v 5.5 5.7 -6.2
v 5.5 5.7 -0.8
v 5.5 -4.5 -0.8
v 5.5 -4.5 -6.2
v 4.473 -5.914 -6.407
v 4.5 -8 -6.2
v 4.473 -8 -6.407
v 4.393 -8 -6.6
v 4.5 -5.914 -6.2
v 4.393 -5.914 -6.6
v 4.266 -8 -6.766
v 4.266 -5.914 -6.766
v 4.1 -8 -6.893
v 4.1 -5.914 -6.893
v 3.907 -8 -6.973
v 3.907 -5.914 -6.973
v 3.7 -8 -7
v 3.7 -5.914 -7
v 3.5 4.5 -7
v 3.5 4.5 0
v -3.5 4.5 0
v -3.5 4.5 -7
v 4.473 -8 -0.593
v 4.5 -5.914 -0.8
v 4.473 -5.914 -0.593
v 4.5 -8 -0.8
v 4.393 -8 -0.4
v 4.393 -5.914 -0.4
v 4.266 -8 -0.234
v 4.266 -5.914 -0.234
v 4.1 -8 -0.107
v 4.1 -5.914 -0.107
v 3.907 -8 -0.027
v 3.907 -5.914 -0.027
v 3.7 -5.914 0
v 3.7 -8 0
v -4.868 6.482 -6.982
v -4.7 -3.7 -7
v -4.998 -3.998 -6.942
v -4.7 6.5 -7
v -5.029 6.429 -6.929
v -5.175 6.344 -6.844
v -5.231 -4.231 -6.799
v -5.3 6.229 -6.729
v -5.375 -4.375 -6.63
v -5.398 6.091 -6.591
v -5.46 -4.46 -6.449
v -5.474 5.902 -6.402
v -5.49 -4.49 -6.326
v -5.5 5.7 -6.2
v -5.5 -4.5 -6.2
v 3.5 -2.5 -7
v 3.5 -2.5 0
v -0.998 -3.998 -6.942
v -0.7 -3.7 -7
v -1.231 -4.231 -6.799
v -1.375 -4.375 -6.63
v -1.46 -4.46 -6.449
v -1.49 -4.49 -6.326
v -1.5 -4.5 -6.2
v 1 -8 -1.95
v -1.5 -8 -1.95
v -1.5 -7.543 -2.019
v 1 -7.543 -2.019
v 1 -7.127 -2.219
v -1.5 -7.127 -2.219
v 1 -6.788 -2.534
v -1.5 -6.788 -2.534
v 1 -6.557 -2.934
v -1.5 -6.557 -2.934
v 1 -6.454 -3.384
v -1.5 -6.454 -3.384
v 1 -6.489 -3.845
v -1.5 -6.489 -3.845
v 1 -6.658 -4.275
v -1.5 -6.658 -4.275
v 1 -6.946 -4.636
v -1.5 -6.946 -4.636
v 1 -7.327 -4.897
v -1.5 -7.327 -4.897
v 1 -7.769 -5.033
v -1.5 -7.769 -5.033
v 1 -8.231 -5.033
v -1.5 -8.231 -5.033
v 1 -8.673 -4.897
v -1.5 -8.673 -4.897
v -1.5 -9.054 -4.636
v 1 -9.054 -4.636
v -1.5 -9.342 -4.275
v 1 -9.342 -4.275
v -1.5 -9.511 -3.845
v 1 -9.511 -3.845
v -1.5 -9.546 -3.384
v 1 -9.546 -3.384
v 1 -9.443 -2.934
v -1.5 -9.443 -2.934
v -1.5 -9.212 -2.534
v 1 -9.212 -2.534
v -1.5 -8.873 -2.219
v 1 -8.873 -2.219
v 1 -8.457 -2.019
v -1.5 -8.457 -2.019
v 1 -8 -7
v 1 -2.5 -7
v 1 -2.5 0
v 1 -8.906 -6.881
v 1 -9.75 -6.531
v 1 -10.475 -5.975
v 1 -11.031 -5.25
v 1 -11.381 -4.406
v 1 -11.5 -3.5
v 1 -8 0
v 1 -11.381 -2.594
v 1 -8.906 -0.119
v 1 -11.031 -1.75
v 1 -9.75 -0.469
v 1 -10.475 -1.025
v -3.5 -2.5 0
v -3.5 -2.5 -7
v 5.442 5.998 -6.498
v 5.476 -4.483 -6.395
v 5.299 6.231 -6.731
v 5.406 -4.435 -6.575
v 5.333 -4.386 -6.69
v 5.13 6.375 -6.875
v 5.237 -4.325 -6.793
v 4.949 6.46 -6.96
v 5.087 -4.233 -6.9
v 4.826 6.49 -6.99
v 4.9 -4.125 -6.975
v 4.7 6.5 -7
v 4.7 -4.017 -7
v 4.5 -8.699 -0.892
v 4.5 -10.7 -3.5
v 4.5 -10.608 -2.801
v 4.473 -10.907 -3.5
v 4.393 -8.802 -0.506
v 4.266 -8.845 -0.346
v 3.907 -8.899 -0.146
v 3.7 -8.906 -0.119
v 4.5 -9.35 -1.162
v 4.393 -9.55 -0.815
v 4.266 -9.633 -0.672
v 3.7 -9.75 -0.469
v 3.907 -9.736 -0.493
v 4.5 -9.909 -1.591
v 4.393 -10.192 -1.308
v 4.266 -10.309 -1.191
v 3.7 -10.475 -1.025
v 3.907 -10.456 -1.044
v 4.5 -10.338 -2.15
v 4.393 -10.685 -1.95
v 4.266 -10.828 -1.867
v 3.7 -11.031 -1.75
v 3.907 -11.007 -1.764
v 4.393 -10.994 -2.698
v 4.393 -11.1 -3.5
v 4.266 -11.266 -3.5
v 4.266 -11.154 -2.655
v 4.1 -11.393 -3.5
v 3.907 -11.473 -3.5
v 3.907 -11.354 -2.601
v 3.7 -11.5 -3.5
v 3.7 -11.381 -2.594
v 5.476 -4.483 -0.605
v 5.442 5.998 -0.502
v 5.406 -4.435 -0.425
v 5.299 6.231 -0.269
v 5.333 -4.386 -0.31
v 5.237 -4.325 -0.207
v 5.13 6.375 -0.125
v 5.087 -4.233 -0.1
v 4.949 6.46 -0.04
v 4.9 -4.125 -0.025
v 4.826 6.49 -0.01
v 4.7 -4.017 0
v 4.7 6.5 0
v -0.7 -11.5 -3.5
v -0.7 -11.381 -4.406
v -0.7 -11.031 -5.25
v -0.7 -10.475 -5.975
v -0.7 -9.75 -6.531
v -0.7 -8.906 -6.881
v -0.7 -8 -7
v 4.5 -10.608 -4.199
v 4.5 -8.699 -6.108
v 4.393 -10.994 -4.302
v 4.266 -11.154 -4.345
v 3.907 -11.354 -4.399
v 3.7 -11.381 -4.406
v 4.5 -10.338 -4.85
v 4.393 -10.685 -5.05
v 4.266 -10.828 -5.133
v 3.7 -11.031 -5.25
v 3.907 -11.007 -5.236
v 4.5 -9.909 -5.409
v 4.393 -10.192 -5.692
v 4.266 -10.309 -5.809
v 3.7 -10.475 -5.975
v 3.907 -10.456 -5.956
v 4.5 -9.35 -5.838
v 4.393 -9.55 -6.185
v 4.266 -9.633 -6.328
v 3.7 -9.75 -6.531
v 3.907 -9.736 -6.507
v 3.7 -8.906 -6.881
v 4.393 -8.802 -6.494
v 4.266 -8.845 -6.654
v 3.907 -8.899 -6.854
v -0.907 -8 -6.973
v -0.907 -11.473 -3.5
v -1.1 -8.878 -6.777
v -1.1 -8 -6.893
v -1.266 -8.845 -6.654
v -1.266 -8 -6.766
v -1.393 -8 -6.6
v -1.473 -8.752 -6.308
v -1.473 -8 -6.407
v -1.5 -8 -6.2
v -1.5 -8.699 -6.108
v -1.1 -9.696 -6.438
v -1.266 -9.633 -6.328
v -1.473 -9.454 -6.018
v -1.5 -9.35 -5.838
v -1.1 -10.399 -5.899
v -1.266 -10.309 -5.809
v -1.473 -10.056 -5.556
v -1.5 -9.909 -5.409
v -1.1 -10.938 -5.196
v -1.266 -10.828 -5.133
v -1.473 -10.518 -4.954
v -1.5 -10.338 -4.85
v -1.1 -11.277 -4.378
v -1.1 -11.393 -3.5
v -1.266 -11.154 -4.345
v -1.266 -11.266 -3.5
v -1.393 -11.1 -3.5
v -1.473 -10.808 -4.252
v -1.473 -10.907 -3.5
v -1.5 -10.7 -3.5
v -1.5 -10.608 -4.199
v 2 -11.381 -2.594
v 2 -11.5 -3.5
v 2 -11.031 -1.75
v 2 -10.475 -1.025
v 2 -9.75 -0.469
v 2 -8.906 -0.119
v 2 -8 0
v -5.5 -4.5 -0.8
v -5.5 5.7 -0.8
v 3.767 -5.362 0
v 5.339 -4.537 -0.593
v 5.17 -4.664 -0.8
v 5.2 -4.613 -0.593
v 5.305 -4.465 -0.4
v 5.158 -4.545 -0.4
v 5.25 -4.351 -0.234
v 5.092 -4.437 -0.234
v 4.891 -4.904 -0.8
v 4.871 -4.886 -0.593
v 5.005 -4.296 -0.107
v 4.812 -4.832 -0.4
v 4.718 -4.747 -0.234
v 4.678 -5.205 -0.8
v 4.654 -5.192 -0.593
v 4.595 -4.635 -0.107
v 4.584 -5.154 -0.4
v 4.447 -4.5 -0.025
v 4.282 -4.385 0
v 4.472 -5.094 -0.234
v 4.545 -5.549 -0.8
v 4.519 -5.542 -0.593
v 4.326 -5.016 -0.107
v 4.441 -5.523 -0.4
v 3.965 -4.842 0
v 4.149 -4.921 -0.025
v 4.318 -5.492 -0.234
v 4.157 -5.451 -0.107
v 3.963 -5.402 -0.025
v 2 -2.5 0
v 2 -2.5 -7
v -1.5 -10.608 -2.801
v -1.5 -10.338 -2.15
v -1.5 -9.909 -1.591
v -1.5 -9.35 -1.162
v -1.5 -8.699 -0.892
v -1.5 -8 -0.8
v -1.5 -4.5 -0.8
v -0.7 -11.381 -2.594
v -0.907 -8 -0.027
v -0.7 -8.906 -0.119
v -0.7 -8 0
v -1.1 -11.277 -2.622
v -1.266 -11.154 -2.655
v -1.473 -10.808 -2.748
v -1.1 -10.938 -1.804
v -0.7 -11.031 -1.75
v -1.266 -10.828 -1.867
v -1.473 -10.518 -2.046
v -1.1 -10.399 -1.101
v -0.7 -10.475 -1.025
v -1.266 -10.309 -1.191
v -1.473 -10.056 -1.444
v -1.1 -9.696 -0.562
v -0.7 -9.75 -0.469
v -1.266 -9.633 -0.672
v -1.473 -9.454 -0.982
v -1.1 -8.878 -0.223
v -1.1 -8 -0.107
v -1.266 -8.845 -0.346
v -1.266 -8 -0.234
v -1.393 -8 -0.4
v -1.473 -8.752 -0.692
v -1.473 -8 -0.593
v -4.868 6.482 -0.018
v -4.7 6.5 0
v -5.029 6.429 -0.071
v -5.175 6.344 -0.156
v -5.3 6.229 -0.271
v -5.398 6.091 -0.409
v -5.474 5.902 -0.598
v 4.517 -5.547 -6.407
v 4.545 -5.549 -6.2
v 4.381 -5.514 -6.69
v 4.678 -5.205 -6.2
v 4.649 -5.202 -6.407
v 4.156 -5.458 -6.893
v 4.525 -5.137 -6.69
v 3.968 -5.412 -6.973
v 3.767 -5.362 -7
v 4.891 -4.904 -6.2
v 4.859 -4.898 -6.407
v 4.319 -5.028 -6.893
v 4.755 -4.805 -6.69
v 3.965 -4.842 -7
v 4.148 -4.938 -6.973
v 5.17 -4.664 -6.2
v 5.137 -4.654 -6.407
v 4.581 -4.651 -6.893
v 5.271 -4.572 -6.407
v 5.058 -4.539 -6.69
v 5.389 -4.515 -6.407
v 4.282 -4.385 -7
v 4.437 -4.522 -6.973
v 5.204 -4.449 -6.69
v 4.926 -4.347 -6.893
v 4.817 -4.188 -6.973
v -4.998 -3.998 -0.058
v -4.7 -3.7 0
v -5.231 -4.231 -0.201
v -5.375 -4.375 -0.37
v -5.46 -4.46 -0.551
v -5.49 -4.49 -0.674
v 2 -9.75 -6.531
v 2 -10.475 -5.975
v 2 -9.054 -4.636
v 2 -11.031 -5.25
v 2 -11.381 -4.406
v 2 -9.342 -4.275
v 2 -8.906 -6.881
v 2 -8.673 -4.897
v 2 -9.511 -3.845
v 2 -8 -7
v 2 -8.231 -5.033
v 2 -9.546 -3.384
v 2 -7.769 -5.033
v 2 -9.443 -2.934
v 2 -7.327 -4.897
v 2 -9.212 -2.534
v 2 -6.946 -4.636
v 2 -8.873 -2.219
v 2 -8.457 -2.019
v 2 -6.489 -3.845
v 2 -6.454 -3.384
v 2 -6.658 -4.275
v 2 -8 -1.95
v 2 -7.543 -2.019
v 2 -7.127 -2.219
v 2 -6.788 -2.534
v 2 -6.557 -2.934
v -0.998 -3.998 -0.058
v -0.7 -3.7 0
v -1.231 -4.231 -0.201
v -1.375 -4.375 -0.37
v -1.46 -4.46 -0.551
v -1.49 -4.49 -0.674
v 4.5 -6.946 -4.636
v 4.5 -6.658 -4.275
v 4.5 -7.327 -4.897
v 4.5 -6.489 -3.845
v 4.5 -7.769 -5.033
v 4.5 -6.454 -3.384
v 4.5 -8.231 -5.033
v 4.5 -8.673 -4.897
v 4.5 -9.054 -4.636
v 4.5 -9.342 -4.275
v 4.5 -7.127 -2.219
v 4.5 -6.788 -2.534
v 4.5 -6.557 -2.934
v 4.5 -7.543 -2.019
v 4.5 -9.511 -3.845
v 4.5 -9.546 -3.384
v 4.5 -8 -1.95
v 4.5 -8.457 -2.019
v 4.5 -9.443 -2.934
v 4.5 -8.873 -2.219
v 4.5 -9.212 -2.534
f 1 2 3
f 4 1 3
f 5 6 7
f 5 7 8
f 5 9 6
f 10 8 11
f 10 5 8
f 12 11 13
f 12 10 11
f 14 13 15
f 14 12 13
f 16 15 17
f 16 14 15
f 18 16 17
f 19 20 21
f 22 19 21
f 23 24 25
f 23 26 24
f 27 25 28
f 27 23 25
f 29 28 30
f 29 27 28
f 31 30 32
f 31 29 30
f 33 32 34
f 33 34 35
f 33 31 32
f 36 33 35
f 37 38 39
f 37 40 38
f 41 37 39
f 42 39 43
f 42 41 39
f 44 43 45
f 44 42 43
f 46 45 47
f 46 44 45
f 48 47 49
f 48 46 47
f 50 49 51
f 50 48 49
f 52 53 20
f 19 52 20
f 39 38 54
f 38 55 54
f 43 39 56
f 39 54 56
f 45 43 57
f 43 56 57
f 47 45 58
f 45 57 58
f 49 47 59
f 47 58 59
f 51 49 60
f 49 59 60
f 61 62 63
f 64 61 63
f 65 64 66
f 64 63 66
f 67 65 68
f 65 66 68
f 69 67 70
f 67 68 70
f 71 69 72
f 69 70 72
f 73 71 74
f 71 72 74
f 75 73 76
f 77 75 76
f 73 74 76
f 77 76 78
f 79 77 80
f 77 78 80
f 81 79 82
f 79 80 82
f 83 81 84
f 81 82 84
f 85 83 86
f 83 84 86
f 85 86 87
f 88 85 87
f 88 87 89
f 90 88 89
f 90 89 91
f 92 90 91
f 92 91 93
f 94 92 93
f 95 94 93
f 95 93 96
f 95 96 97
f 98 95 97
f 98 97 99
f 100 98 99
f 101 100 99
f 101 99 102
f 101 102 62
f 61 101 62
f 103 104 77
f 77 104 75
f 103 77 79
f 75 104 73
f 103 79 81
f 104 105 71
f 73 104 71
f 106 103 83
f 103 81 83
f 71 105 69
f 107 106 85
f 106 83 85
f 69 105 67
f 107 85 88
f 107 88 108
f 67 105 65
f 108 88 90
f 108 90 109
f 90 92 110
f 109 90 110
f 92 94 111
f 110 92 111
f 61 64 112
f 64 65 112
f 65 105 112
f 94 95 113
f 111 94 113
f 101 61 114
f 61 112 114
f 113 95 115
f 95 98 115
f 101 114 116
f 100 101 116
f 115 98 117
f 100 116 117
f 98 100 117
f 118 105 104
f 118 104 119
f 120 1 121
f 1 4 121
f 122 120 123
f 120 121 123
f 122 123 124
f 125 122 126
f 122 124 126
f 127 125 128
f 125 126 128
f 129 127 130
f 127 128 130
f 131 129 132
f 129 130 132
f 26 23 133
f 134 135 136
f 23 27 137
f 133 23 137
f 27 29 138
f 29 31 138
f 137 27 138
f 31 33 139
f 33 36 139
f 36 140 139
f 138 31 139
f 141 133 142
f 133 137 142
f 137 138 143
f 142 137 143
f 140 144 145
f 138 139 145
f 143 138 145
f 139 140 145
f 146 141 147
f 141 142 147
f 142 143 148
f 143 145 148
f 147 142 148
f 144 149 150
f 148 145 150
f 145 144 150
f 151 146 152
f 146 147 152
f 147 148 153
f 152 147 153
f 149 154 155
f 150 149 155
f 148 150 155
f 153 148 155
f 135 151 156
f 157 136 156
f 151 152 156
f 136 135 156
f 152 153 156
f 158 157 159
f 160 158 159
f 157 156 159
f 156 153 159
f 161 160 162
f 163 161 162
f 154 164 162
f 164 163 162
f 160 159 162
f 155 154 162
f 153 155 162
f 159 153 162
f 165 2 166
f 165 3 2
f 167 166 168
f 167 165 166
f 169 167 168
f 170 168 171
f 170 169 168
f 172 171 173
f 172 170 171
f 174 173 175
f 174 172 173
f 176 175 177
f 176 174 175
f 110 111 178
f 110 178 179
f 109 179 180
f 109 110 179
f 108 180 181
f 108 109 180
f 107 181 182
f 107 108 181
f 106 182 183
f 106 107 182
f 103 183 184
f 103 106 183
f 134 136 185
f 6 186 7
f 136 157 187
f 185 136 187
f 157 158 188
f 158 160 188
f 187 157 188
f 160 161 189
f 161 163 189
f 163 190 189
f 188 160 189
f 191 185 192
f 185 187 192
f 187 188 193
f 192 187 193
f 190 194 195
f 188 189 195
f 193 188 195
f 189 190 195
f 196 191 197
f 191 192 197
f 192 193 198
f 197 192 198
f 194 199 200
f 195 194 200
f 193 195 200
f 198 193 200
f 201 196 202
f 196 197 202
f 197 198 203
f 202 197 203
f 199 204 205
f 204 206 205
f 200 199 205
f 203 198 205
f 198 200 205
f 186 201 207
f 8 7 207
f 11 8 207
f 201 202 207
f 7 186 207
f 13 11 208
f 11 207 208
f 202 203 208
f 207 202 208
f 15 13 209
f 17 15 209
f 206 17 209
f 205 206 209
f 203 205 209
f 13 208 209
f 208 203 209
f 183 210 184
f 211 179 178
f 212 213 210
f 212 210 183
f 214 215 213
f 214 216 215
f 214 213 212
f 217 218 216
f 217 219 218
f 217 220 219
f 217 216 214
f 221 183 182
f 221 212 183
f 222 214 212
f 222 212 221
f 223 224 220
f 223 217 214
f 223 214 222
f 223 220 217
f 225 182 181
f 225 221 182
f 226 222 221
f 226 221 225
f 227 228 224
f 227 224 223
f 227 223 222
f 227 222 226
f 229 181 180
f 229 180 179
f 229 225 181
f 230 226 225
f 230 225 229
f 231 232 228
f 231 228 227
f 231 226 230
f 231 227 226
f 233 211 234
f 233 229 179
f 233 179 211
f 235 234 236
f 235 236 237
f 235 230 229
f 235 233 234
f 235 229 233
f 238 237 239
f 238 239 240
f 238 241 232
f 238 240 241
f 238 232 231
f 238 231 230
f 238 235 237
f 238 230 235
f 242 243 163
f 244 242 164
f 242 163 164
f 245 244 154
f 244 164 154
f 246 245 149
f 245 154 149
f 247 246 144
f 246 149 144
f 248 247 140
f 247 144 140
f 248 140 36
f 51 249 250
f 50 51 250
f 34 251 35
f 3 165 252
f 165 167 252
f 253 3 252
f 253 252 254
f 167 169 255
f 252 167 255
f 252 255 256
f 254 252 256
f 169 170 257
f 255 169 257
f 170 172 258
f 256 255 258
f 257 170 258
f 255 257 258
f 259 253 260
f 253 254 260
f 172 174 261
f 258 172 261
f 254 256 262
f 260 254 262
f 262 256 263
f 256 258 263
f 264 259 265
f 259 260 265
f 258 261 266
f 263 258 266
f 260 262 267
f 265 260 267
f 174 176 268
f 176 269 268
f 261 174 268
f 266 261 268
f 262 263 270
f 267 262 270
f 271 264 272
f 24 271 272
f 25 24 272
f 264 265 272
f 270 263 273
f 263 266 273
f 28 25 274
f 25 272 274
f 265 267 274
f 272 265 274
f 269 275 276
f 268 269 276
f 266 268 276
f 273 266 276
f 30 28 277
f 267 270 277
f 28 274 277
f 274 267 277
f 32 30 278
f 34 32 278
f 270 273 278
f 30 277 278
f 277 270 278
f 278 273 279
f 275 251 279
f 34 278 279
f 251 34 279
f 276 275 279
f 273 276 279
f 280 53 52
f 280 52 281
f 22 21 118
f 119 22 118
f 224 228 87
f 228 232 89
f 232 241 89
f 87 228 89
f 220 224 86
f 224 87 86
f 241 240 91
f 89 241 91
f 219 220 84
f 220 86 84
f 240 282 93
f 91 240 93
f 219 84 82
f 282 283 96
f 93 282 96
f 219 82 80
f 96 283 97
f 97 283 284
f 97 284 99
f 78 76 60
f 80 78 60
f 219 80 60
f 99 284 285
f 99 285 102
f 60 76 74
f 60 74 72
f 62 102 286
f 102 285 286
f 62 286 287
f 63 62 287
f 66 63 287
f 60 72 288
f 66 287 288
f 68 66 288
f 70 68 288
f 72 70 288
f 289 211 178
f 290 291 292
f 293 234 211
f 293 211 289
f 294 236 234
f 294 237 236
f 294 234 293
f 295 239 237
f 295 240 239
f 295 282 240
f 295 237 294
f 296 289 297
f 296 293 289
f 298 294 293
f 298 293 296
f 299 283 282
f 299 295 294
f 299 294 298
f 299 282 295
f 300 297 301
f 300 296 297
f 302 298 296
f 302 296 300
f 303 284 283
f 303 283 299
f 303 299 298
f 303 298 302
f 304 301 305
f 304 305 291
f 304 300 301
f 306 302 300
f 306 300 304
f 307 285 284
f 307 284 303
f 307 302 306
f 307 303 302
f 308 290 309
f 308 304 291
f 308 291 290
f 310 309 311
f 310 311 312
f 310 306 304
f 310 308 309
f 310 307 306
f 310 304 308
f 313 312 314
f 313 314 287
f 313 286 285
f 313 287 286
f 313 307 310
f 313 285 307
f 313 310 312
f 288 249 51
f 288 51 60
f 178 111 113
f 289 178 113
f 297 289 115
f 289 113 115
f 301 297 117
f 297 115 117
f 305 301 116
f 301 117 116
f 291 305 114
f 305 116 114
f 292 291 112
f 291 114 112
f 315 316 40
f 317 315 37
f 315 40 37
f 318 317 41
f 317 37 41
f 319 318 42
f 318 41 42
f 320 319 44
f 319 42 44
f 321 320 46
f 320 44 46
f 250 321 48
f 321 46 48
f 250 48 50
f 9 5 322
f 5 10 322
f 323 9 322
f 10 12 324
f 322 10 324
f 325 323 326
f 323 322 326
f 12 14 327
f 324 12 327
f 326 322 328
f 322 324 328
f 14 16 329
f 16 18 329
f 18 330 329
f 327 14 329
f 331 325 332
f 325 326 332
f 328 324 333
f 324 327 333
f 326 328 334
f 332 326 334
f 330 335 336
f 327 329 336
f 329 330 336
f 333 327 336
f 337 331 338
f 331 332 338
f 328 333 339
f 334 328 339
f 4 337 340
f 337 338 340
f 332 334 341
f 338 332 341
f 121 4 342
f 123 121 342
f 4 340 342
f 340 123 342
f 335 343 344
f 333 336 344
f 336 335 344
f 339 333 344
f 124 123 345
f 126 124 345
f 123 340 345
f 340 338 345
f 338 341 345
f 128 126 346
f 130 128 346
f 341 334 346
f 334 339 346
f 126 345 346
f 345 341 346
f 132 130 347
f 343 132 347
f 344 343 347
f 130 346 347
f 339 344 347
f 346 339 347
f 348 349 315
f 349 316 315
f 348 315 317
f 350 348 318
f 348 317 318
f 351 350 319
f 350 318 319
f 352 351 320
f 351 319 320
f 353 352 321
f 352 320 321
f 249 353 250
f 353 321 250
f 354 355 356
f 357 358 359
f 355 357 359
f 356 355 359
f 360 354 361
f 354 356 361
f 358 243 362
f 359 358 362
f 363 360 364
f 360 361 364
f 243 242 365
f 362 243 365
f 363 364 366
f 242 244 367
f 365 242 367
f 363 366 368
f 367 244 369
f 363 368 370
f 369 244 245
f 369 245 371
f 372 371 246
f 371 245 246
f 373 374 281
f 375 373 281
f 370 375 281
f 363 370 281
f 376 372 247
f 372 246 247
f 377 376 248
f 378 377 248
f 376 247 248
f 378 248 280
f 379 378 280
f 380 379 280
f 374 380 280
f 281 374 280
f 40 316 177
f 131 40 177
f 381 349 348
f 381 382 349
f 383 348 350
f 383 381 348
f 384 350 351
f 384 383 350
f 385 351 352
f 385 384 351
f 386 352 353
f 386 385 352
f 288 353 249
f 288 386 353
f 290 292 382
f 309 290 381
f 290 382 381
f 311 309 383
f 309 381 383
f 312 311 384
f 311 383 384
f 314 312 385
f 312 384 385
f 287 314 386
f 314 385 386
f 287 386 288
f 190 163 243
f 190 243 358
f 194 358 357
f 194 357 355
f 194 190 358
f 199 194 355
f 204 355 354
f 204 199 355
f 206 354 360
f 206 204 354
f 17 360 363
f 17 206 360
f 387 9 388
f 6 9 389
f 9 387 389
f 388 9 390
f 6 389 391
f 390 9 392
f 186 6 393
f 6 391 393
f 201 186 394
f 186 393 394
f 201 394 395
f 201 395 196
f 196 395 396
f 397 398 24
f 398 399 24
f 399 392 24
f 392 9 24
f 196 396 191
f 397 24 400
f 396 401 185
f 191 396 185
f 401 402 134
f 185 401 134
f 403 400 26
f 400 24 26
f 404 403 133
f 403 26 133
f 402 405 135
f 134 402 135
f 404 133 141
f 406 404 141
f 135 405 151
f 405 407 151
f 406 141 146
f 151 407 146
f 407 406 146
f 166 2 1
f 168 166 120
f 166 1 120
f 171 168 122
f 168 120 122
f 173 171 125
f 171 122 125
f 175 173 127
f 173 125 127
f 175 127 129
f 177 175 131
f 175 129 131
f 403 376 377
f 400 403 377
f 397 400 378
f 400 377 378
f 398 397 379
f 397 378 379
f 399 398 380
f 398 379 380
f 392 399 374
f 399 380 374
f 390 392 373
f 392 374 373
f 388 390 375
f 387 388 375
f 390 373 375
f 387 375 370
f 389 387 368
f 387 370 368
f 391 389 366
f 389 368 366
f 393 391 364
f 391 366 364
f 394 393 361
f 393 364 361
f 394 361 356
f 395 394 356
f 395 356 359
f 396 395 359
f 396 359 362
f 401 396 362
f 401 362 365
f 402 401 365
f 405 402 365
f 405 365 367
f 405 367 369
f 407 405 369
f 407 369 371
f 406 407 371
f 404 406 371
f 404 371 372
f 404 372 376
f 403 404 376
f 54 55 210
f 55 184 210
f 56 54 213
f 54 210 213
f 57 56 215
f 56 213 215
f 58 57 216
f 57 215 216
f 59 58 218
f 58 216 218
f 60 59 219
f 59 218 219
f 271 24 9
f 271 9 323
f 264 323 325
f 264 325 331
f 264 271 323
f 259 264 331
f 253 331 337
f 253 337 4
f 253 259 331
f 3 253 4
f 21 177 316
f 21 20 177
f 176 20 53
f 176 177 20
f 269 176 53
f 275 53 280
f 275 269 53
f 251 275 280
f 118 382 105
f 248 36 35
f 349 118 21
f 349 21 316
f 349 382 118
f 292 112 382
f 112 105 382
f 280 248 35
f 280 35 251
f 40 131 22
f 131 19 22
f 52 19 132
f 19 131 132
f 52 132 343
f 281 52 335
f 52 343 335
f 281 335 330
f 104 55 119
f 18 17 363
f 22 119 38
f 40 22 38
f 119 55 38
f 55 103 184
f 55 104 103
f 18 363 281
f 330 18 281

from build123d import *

# Parameters (mm, degrees)
EXTRUDE_1_DEPTH     = 7
FILLET_1_R          = 3.5
SKETCH_2_R          = 1.55
CUT_EXTRUDE_1_DEPTH = 16.173990905
FILLET_2_R          = 1.5
FILLET_3_R          = 0.8


# Some blends are built 0.0001 mm under size
with BuildPart() as part:
    # 草图1 → 凸台-拉伸1 (new body)
    with BuildSketch(Plane.XY):
        Polygon((2, -2.5), (2.5, -2.5), (3.5, -2.5), (3.5, 4.5), (-3.5, 4.5), (-3.5, -2.5), (-2.5, -2.5), (1, -2.5), (1, -11.5), (0.5, -11.5), (-1.5, -11.5), (-1.5, -4.5), (-4.5, -4.5), (-5.5, -4.5), (-5.5, 6.5), (5.5, 6.5), (5.5, -4.5), (4.5, -4.5), (4.5, -11.5), (2.5, -11.5), (2, -11.5), align=None)
    extrude(amount=-EXTRUDE_1_DEPTH)

    # 圆角1
    fillet_1_edges = [part.edges().sort_by_distance(p)[0] for p in [
        (3.25, -11.5, 0),
        (3.25, -11.5, -7),
        (-0.25, -11.5, -7),
        (-0.25, -11.5, 0),
    ]]
    fillet(fillet_1_edges, radius=FILLET_1_R - 0.0001)  # a hair under: the kernel refuses the full size

    # 草图2 → 切除-拉伸1 (cut, through all)
    with BuildSketch(Plane.ZY.offset(1.5)):
        with Locations((-3.5, -8)):
            Circle(SKETCH_2_R)
    extrude(amount=-CUT_EXTRUDE_1_DEPTH, mode=Mode.SUBTRACT)

    # 圆角2
    # the kernel refuses this fillet: 1.5 mm, written as the material it adds along each edge
    with BuildSketch(Plane(origin=(4.5, -4.5, 0), x_dir=(1, 0, 0), z_dir=(0, 0, -1))) as fillet_2_piece_1:
        with BuildLine():
            CenterArc((1.5, 1.414213562), FILLET_2_R, 180, 70.528779366)
            Line((0, 1.414213562), (-0.03, 1.414213562))
            Line((-0.03, 1.414213562), (-0.03, 0))
            Line((-0.03, 0), (0, -0.03))
            ThreePointArc((0, -0.03), (0.5, -0.03), (0.99, -0.028284271))
            Line((0.99, -0.028284271), (1, 0))
        make_face()
    extrude(amount=7)

    # 圆角3
    fillet_3_edges = [part.edges().sort_by_distance(p)[0] for p in [
        (-1.5, -6.25005, 0),
        (-3.5, -4.5, 0),
        (-5.5, 1, 0),
        (5.5, 1, 0),
        (5.5, 1, -7),
        (-5.5, 1, -7),
        (-3.5, -4.5, -7),
        (-5.5, 6.5, -3.5),
        (5.5, 6.5, -3.5),
        (-1.5, -6.25005, -7),
        (4.5, -6.957156781, 0),
        (4.5, -6.957156781, -7),
        (4.5, -10.474903023, -5.974903023),
        (4.5, -10.474903023, -1.025096977),
        (-1.5, -10.474903023, -1.025096977),
        (-1.5, -10.474903023, -5.974903023),
        (4.775255129, -5.048188159, 0),
        (4.775255129, -5.048188159, -7),
    ]]
    fillet(fillet_3_edges, radius=FILLET_3_R)


solid = part.part
